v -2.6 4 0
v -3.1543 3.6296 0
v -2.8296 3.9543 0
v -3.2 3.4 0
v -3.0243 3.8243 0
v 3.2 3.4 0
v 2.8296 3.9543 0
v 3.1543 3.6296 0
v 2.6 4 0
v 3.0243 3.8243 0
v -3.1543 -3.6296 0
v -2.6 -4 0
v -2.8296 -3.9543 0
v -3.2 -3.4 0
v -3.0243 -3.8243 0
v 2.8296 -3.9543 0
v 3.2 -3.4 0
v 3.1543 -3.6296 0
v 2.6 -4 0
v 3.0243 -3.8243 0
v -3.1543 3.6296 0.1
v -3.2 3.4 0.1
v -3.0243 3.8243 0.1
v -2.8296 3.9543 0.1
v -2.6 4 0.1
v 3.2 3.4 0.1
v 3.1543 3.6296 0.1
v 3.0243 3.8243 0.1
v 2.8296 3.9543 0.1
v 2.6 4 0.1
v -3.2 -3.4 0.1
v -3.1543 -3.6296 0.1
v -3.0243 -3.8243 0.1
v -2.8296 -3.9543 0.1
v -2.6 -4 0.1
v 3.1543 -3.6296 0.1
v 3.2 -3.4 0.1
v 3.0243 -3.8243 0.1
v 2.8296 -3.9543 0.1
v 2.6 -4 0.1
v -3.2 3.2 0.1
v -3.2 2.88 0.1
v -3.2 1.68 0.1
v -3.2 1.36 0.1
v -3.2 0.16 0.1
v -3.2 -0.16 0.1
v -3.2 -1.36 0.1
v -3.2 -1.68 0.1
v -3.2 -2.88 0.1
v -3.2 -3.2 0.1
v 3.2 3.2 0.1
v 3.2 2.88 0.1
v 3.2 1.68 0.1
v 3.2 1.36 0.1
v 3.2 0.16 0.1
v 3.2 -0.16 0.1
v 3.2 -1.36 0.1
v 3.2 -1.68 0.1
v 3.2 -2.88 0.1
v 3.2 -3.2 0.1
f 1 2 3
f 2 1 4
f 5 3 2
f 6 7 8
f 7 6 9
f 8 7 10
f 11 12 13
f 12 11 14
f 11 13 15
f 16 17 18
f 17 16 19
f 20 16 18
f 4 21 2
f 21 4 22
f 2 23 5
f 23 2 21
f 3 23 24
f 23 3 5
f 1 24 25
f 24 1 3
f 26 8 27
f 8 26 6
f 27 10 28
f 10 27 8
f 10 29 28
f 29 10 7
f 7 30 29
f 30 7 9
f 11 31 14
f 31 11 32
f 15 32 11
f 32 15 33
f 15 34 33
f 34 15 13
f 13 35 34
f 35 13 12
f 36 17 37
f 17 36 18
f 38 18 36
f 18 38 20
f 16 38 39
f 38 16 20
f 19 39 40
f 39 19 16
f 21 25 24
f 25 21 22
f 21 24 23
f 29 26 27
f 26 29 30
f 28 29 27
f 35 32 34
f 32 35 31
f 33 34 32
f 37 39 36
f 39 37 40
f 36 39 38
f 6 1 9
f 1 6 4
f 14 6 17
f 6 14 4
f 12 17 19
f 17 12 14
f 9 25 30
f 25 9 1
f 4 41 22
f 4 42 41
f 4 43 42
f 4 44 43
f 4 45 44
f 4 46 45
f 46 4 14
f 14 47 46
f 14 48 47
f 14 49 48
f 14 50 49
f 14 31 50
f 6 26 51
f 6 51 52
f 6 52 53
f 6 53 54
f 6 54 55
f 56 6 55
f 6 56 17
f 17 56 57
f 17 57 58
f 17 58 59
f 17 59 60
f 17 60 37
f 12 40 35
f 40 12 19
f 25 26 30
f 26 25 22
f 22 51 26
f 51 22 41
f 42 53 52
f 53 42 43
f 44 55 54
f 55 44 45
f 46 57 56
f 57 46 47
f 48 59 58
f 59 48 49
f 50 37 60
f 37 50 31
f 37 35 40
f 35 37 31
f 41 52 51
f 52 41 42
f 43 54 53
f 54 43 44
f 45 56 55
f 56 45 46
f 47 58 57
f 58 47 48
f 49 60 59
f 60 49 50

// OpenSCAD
// file: ../p/1-4cyli.scad
use <../lib.scad>
function ldraw_lib__1_4cyli() = [
// 0 Cylinder 0.25
// 0 Name: 1-4cyli.dat
// 0 Author: James Jessiman
// 0 !LDRAW_ORG Primitive UPDATE 2012-01
// 0 !LICENSE Licensed under CC BY 4.0 : see CAreadme.txt
// 
// 0 BFC CERTIFY CCW
  [0,"BFC","CERTIFY"],
  [0,"BFC","CCW"],
// 
// 0 !HISTORY 2002-03-23 [sbliss] Added BFC statement.
// 0 !HISTORY 2002-04-25 [PTadmin] Official Update 2002-02
// 0 !HISTORY 2007-06-22 [PTadmin] Header formatted for Contributor Agreement
// 0 !HISTORY 2008-07-01 [PTadmin] Official Update 2008-01
// 0 !HISTORY 2012-02-16 [Philo] Changed to CCW
// 0 !HISTORY 2012-03-30 [PTadmin] Official Update 2012-01
// 
// 
// 4 16 1 1 0 0.9239 1 0.3827 0.9239 0 0.3827 1 0 0
  [4,16,1,1,0,0.9239,1,0.3827,0.9239,0,0.3827,1,0,0],
// 5 24 1 0 0 1 1 0 0.9239 0 0.3827 1 0 -1
  [5,24,1,0,0,1,1,0,0.9239,0,0.3827,1,0,-1],
// 4 16 0.9239 1 0.3827 0.7071 1 0.7071 0.7071 0 0.7071 0.9239 0 0.3827
  [4,16,0.9239,1,0.3827,0.7071,1,0.7071,0.7071,0,0.7071,0.9239,0,0.3827],
// 5 24 0.9239 0 0.3827 0.9239 1 0.3827 0.7071 0 0.7071 1 0 0
  [5,24,0.9239,0,0.3827,0.9239,1,0.3827,0.7071,0,0.7071,1,0,0],
// 4 16 0.7071 1 0.7071 0.3827 1 0.9239 0.3827 0 0.9239 0.7071 0 0.7071
  [4,16,0.7071,1,0.7071,0.3827,1,0.9239,0.3827,0,0.9239,0.7071,0,0.7071],
// 5 24 0.7071 0 0.7071 0.7071 1 0.7071 0.3827 0 0.9239 0.9239 0 0.3827
  [5,24,0.7071,0,0.7071,0.7071,1,0.7071,0.3827,0,0.9239,0.9239,0,0.3827],
// 4 16 0.3827 1 0.9239 0 1 1 0 0 1 0.3827 0 0.9239
  [4,16,0.3827,1,0.9239,0,1,1,0,0,1,0.3827,0,0.9239],
// 5 24 0.3827 0 0.9239 0.3827 1 0.9239 0 0 1 0.7071 0 0.7071
  [5,24,0.3827,0,0.9239,0.3827,1,0.9239,0,0,1,0.7071,0,0.7071],
// 5 24 0 0 1 0 1 1 0.3827 0 0.9239 -1 0 1
  [5,24,0,0,1,0,1,1,0.3827,0,0.9239,-1,0,1],
];
module ldraw_lib__1_4cyli(step=0, col=false, unit=2/5, alt=false, line=0.2, solid=!$preview)
    makepoly(ldraw_lib__1_4cyli(), step=step, col=col, unit=unit, alt=alt, line=line, solid=solid);
ldraw_lib__1_4cyli(line=0.2);
// file: ../p/1-4chrd.scad
use <../lib.scad>
function ldraw_lib__1_4chrd() = [
// 0 Chord 0.25
// 0 Name: 1-4chrd.dat
// 0 Author: Tony Hafner [hafhead]
// 0 !LDRAW_ORG Primitive UPDATE 2012-02
// 0 !LICENSE Licensed under CC BY 2.0 and CC BY 4.0 : see CAreadme.txt
// 
// 0 BFC CERTIFY CCW
  [0,"BFC","CERTIFY"],
  [0,"BFC","CCW"],
// 
// 0 !HISTORY 2004-04-22 [PTadmin] Official Update 2004-02
// 0 !HISTORY 2007-10-09 [PTadmin] Header formatted for Contributor Agreement
// 0 !HISTORY 2008-07-01 [PTadmin] Official Update 2008-01
// 0 !HISTORY 2012-08-02 [MMR1988] Re-creation with PrimGen2 and Rectifier
// 0 !HISTORY 2012-08-09 [PTadmin] Official Update 2012-02
// 
// 
// 4 16 0.9239 0 0.3827 0.3827 0 0.9239 0 0 1 1 0 0
  [4,16,0.9239,0,0.3827,0.3827,0,0.9239,0,0,1,1,0,0],
// 3 16 0.7071 0 0.7071 0.3827 0 0.9239 0.9239 0 0.3827
  [3,16,0.7071,0,0.7071,0.3827,0,0.9239,0.9239,0,0.3827],
];
module ldraw_lib__1_4chrd(step=0, col=false, unit=2/5, alt=false, line=0.2, solid=!$preview)
    makepoly(ldraw_lib__1_4chrd(), step=step, col=col, unit=unit, alt=alt, line=line, solid=solid);
ldraw_lib__1_4chrd(line=0.2);
// main file
use <../lib.scad>
use <../p/1-4chrd.scad>
use <../p/1-4cyli.scad>
function ldraw_lib__6142275h() = [
// 0 Sticker  1 x  0.8 with  5 Dark Grey Stripes on Black Background
// 0 Name: 6142275h.dat
// 0 Author: Massimo Maso [Sirio]
// 0 !LDRAW_ORG Part UPDATE 2022-06
// 0 !LICENSE Licensed under CC BY 4.0 : see CAreadme.txt
// 
// 0 BFC CERTIFY CCW
  [0,"BFC","CERTIFY"],
  [0,"BFC","CCW"],
// 
// 0 !KEYWORDS Audi, e-tron, quattro, R18, Set 75872, Speed Champions
// 
// 0 !HISTORY 2022-12-20 [PTadmin] Official Update 2022-06
// 
// 
// 0 // Primitives
// 1 16 -6.5 0 8.5 -1.5 0 0 0 -1 0 0 0 1.5 1-4chrd.dat
  [1,16,-6.5,0,8.5,-1.5,0,0,0,-1,0,0,0,1.5, ldraw_lib__1_4chrd()],
// 1 16 6.5 0 8.5 1.5 0 0 0 -1 0 0 0 1.5 1-4chrd.dat
  [1,16,6.5,0,8.5,1.5,0,0,0,-1,0,0,0,1.5, ldraw_lib__1_4chrd()],
// 1 16 -6.5 0 -8.5 -1.5 0 0 0 -1 0 0 0 -1.5 1-4chrd.dat
  [1,16,-6.5,0,-8.5,-1.5,0,0,0,-1,0,0,0,-1.5, ldraw_lib__1_4chrd()],
// 1 16 6.5 0 -8.5 1.5 0 0 0 -1 0 0 0 -1.5 1-4chrd.dat
  [1,16,6.5,0,-8.5,1.5,0,0,0,-1,0,0,0,-1.5, ldraw_lib__1_4chrd()],
// 1 16 -6.5 0 8.5 -1.5 0 0 0 -.25 0 0 0 1.5 1-4cyli.dat
  [1,16,-6.5,0,8.5,-1.5,0,0,0,-.25,0,0,0,1.5, ldraw_lib__1_4cyli()],
// 1 16 6.5 0 8.5 1.5 0 0 0 -.25 0 0 0 1.5 1-4cyli.dat
  [1,16,6.5,0,8.5,1.5,0,0,0,-.25,0,0,0,1.5, ldraw_lib__1_4cyli()],
// 1 16 -6.5 0 -8.5 -1.5 0 0 0 -.25 0 0 0 -1.5 1-4cyli.dat
  [1,16,-6.5,0,-8.5,-1.5,0,0,0,-.25,0,0,0,-1.5, ldraw_lib__1_4cyli()],
// 1 16 6.5 0 -8.5 1.5 0 0 0 -.25 0 0 0 -1.5 1-4cyli.dat
  [1,16,6.5,0,-8.5,1.5,0,0,0,-.25,0,0,0,-1.5, ldraw_lib__1_4cyli()],
// 1 0 -6.5 -.25 8.5 -1.5 0 0 0 1 0 0 0 1.5 1-4chrd.dat
  [1,0,-6.5,-.25,8.5,-1.5,0,0,0,1,0,0,0,1.5, ldraw_lib__1_4chrd()],
// 1 0 6.5 -.25 8.5 1.5 0 0 0 1 0 0 0 1.5 1-4chrd.dat
  [1,0,6.5,-.25,8.5,1.5,0,0,0,1,0,0,0,1.5, ldraw_lib__1_4chrd()],
// 1 0 -6.5 -.25 -8.5 -1.5 0 0 0 1 0 0 0 -1.5 1-4chrd.dat
  [1,0,-6.5,-.25,-8.5,-1.5,0,0,0,1,0,0,0,-1.5, ldraw_lib__1_4chrd()],
// 1 0 6.5 -.25 -8.5 1.5 0 0 0 1 0 0 0 -1.5 1-4chrd.dat
  [1,0,6.5,-.25,-8.5,1.5,0,0,0,1,0,0,0,-1.5, ldraw_lib__1_4chrd()],
// 0 // Bottom faces
// 4 16 6.5 0 10 8 0 8.5 -8 0 8.5 -6.5 0 10
  [4,16,6.5,0,10,8,0,8.5,-8,0,8.5,-6.5,0,10],
// 4 16 -8 0 8.5 8 0 8.5 8 0 -8.5 -8 0 -8.5
  [4,16,-8,0,8.5,8,0,8.5,8,0,-8.5,-8,0,-8.5],
// 4 16 6.5 0 -10 -6.5 0 -10 -8 0 -8.5 8 0 -8.5
  [4,16,6.5,0,-10,-6.5,0,-10,-8,0,-8.5,8,0,-8.5],
// 0 // Lateral faces
// 4 16 -6.5 0 10 -6.5 -.25 10 6.5 -.25 10 6.5 0 10
  [4,16,-6.5,0,10,-6.5,-.25,10,6.5,-.25,10,6.5,0,10],
// 3 16 -8 0 8.5 -8 -.25 8 -8 -.25 8.5
  [3,16,-8,0,8.5,-8,-.25,8,-8,-.25,8.5],
// 3 16 -8 0 8.5 -8 -.25 7.2 -8 -.25 8
  [3,16,-8,0,8.5,-8,-.25,7.2,-8,-.25,8],
// 3 16 -8 0 8.5 -8 -.25 4.2 -8 -.25 7.2
  [3,16,-8,0,8.5,-8,-.25,4.2,-8,-.25,7.2],
// 3 16 -8 0 8.5 -8 -.25 3.4 -8 -.25 4.2
  [3,16,-8,0,8.5,-8,-.25,3.4,-8,-.25,4.2],
// 3 16 -8 0 8.5 -8 -.25 .4 -8 -.25 3.4
  [3,16,-8,0,8.5,-8,-.25,.4,-8,-.25,3.4],
// 4 16 -8 0 8.5 -8 0 -8.5 -8 -.25 -.4 -8 -.25 .4
  [4,16,-8,0,8.5,-8,0,-8.5,-8,-.25,-.4,-8,-.25,.4],
// 3 16 -8 0 -8.5 -8 -.25 -3.4 -8 -.25 -.4
  [3,16,-8,0,-8.5,-8,-.25,-3.4,-8,-.25,-.4],
// 3 16 -8 0 -8.5 -8 -.25 -4.2 -8 -.25 -3.4
  [3,16,-8,0,-8.5,-8,-.25,-4.2,-8,-.25,-3.4],
// 3 16 -8 0 -8.5 -8 -.25 -7.2 -8 -.25 -4.2
  [3,16,-8,0,-8.5,-8,-.25,-7.2,-8,-.25,-4.2],
// 3 16 -8 0 -8.5 -8 -.25 -8 -8 -.25 -7.2
  [3,16,-8,0,-8.5,-8,-.25,-8,-8,-.25,-7.2],
// 3 16 -8 0 -8.5 -8 -.25 -8.5 -8 -.25 -8
  [3,16,-8,0,-8.5,-8,-.25,-8.5,-8,-.25,-8],
// 3 16 8 0 8.5 8 -.25 8.5 8 -.25 8
  [3,16,8,0,8.5,8,-.25,8.5,8,-.25,8],
// 3 16 8 0 8.5 8 -.25 8 8 -.25 7.2
  [3,16,8,0,8.5,8,-.25,8,8,-.25,7.2],
// 3 16 8 0 8.5 8 -.25 7.2 8 -.25 4.2
  [3,16,8,0,8.5,8,-.25,7.2,8,-.25,4.2],
// 3 16 8 0 8.5 8 -.25 4.2 8 -.25 3.4
  [3,16,8,0,8.5,8,-.25,4.2,8,-.25,3.4],
// 3 16 8 0 8.5 8 -.25 3.4 8 -.25 .4
  [3,16,8,0,8.5,8,-.25,3.4,8,-.25,.4],
// 4 16 8 0 -8.5 8 0 8.5 8 -.25 .4 8 -.25 -.4
  [4,16,8,0,-8.5,8,0,8.5,8,-.25,.4,8,-.25,-.4],
// 3 16 8 0 -8.5 8 -.25 -.4 8 -.25 -3.4
  [3,16,8,0,-8.5,8,-.25,-.4,8,-.25,-3.4],
// 3 16 8 0 -8.5 8 -.25 -3.4 8 -.25 -4.2
  [3,16,8,0,-8.5,8,-.25,-3.4,8,-.25,-4.2],
// 3 16 8 0 -8.5 8 -.25 -4.2 8 -.25 -7.2
  [3,16,8,0,-8.5,8,-.25,-4.2,8,-.25,-7.2],
// 3 16 8 0 -8.5 8 -.25 -7.2 8 -.25 -8
  [3,16,8,0,-8.5,8,-.25,-7.2,8,-.25,-8],
// 3 16 8 0 -8.5 8 -.25 -8 8 -.25 -8.5
  [3,16,8,0,-8.5,8,-.25,-8,8,-.25,-8.5],
// 4 16 -6.5 0 -10 6.5 0 -10 6.5 -.25 -10 -6.5 -.25 -10
  [4,16,-6.5,0,-10,6.5,0,-10,6.5,-.25,-10,-6.5,-.25,-10],
// 0 // Top faces
// 0 // Black faces
// 4 0 -6.5 -.25 10 -8 -.25 8.5 8 -.25 8.5 6.5 -.25 10
  [4,0,-6.5,-.25,10,-8,-.25,8.5,8,-.25,8.5,6.5,-.25,10],
// 4 0 -8 -.25 8.5 -8 -.25 8 8 -.25 8 8 -.25 8.5
  [4,0,-8,-.25,8.5,-8,-.25,8,8,-.25,8,8,-.25,8.5],
// 4 0 -8 -.25 7.2 -8 -.25 4.2 8 -.25 4.2 8 -.25 7.2
  [4,0,-8,-.25,7.2,-8,-.25,4.2,8,-.25,4.2,8,-.25,7.2],
// 4 0 -8 -.25 3.4 -8 -.25 .4 8 -.25 .4 8 -.25 3.4
  [4,0,-8,-.25,3.4,-8,-.25,.4,8,-.25,.4,8,-.25,3.4],
// 4 0 -8 -.25 -.4 -8 -.25 -3.4 8 -.25 -3.4 8 -.25 -.4
  [4,0,-8,-.25,-.4,-8,-.25,-3.4,8,-.25,-3.4,8,-.25,-.4],
// 4 0 -8 -.25 -4.2 -8 -.25 -7.2 8 -.25 -7.2 8 -.25 -4.2
  [4,0,-8,-.25,-4.2,-8,-.25,-7.2,8,-.25,-7.2,8,-.25,-4.2],
// 4 0 -8 -.25 -8 -8 -.25 -8.5 8 -.25 -8.5 8 -.25 -8
  [4,0,-8,-.25,-8,-8,-.25,-8.5,8,-.25,-8.5,8,-.25,-8],
// 4 0 -8 -.25 -8.5 -6.5 -.25 -10 6.5 -.25 -10 8 -.25 -8.5
  [4,0,-8,-.25,-8.5,-6.5,-.25,-10,6.5,-.25,-10,8,-.25,-8.5],
// 0 // Dark grey stripes
// 4 72 -8 -.25 8 -8 -.25 7.2 8 -.25 7.2 8 -.25 8
  [4,72,-8,-.25,8,-8,-.25,7.2,8,-.25,7.2,8,-.25,8],
// 4 72 -8 -.25 4.2 -8 -.25 3.4 8 -.25 3.4 8 -.25 4.2
  [4,72,-8,-.25,4.2,-8,-.25,3.4,8,-.25,3.4,8,-.25,4.2],
// 4 72 -8 -.25 .4 -8 -.25 -.4 8 -.25 -.4 8 -.25 .4
  [4,72,-8,-.25,.4,-8,-.25,-.4,8,-.25,-.4,8,-.25,.4],
// 4 72 -8 -.25 -3.4 -8 -.25 -4.2 8 -.25 -4.2 8 -.25 -3.4
  [4,72,-8,-.25,-3.4,-8,-.25,-4.2,8,-.25,-4.2,8,-.25,-3.4],
// 4 72 -8 -.25 -7.2 -8 -.25 -8 8 -.25 -8 8 -.25 -7.2
  [4,72,-8,-.25,-7.2,-8,-.25,-8,8,-.25,-8,8,-.25,-7.2],
];
module ldraw_lib__6142275h(step=0, col=false, unit=2/5, alt=false, line=0.2, solid=!$preview)
    makepoly(ldraw_lib__6142275h(), step=step, col=col, unit=unit, alt=alt, line=line, solid=solid);
ldraw_lib__6142275h(line=0.2);
